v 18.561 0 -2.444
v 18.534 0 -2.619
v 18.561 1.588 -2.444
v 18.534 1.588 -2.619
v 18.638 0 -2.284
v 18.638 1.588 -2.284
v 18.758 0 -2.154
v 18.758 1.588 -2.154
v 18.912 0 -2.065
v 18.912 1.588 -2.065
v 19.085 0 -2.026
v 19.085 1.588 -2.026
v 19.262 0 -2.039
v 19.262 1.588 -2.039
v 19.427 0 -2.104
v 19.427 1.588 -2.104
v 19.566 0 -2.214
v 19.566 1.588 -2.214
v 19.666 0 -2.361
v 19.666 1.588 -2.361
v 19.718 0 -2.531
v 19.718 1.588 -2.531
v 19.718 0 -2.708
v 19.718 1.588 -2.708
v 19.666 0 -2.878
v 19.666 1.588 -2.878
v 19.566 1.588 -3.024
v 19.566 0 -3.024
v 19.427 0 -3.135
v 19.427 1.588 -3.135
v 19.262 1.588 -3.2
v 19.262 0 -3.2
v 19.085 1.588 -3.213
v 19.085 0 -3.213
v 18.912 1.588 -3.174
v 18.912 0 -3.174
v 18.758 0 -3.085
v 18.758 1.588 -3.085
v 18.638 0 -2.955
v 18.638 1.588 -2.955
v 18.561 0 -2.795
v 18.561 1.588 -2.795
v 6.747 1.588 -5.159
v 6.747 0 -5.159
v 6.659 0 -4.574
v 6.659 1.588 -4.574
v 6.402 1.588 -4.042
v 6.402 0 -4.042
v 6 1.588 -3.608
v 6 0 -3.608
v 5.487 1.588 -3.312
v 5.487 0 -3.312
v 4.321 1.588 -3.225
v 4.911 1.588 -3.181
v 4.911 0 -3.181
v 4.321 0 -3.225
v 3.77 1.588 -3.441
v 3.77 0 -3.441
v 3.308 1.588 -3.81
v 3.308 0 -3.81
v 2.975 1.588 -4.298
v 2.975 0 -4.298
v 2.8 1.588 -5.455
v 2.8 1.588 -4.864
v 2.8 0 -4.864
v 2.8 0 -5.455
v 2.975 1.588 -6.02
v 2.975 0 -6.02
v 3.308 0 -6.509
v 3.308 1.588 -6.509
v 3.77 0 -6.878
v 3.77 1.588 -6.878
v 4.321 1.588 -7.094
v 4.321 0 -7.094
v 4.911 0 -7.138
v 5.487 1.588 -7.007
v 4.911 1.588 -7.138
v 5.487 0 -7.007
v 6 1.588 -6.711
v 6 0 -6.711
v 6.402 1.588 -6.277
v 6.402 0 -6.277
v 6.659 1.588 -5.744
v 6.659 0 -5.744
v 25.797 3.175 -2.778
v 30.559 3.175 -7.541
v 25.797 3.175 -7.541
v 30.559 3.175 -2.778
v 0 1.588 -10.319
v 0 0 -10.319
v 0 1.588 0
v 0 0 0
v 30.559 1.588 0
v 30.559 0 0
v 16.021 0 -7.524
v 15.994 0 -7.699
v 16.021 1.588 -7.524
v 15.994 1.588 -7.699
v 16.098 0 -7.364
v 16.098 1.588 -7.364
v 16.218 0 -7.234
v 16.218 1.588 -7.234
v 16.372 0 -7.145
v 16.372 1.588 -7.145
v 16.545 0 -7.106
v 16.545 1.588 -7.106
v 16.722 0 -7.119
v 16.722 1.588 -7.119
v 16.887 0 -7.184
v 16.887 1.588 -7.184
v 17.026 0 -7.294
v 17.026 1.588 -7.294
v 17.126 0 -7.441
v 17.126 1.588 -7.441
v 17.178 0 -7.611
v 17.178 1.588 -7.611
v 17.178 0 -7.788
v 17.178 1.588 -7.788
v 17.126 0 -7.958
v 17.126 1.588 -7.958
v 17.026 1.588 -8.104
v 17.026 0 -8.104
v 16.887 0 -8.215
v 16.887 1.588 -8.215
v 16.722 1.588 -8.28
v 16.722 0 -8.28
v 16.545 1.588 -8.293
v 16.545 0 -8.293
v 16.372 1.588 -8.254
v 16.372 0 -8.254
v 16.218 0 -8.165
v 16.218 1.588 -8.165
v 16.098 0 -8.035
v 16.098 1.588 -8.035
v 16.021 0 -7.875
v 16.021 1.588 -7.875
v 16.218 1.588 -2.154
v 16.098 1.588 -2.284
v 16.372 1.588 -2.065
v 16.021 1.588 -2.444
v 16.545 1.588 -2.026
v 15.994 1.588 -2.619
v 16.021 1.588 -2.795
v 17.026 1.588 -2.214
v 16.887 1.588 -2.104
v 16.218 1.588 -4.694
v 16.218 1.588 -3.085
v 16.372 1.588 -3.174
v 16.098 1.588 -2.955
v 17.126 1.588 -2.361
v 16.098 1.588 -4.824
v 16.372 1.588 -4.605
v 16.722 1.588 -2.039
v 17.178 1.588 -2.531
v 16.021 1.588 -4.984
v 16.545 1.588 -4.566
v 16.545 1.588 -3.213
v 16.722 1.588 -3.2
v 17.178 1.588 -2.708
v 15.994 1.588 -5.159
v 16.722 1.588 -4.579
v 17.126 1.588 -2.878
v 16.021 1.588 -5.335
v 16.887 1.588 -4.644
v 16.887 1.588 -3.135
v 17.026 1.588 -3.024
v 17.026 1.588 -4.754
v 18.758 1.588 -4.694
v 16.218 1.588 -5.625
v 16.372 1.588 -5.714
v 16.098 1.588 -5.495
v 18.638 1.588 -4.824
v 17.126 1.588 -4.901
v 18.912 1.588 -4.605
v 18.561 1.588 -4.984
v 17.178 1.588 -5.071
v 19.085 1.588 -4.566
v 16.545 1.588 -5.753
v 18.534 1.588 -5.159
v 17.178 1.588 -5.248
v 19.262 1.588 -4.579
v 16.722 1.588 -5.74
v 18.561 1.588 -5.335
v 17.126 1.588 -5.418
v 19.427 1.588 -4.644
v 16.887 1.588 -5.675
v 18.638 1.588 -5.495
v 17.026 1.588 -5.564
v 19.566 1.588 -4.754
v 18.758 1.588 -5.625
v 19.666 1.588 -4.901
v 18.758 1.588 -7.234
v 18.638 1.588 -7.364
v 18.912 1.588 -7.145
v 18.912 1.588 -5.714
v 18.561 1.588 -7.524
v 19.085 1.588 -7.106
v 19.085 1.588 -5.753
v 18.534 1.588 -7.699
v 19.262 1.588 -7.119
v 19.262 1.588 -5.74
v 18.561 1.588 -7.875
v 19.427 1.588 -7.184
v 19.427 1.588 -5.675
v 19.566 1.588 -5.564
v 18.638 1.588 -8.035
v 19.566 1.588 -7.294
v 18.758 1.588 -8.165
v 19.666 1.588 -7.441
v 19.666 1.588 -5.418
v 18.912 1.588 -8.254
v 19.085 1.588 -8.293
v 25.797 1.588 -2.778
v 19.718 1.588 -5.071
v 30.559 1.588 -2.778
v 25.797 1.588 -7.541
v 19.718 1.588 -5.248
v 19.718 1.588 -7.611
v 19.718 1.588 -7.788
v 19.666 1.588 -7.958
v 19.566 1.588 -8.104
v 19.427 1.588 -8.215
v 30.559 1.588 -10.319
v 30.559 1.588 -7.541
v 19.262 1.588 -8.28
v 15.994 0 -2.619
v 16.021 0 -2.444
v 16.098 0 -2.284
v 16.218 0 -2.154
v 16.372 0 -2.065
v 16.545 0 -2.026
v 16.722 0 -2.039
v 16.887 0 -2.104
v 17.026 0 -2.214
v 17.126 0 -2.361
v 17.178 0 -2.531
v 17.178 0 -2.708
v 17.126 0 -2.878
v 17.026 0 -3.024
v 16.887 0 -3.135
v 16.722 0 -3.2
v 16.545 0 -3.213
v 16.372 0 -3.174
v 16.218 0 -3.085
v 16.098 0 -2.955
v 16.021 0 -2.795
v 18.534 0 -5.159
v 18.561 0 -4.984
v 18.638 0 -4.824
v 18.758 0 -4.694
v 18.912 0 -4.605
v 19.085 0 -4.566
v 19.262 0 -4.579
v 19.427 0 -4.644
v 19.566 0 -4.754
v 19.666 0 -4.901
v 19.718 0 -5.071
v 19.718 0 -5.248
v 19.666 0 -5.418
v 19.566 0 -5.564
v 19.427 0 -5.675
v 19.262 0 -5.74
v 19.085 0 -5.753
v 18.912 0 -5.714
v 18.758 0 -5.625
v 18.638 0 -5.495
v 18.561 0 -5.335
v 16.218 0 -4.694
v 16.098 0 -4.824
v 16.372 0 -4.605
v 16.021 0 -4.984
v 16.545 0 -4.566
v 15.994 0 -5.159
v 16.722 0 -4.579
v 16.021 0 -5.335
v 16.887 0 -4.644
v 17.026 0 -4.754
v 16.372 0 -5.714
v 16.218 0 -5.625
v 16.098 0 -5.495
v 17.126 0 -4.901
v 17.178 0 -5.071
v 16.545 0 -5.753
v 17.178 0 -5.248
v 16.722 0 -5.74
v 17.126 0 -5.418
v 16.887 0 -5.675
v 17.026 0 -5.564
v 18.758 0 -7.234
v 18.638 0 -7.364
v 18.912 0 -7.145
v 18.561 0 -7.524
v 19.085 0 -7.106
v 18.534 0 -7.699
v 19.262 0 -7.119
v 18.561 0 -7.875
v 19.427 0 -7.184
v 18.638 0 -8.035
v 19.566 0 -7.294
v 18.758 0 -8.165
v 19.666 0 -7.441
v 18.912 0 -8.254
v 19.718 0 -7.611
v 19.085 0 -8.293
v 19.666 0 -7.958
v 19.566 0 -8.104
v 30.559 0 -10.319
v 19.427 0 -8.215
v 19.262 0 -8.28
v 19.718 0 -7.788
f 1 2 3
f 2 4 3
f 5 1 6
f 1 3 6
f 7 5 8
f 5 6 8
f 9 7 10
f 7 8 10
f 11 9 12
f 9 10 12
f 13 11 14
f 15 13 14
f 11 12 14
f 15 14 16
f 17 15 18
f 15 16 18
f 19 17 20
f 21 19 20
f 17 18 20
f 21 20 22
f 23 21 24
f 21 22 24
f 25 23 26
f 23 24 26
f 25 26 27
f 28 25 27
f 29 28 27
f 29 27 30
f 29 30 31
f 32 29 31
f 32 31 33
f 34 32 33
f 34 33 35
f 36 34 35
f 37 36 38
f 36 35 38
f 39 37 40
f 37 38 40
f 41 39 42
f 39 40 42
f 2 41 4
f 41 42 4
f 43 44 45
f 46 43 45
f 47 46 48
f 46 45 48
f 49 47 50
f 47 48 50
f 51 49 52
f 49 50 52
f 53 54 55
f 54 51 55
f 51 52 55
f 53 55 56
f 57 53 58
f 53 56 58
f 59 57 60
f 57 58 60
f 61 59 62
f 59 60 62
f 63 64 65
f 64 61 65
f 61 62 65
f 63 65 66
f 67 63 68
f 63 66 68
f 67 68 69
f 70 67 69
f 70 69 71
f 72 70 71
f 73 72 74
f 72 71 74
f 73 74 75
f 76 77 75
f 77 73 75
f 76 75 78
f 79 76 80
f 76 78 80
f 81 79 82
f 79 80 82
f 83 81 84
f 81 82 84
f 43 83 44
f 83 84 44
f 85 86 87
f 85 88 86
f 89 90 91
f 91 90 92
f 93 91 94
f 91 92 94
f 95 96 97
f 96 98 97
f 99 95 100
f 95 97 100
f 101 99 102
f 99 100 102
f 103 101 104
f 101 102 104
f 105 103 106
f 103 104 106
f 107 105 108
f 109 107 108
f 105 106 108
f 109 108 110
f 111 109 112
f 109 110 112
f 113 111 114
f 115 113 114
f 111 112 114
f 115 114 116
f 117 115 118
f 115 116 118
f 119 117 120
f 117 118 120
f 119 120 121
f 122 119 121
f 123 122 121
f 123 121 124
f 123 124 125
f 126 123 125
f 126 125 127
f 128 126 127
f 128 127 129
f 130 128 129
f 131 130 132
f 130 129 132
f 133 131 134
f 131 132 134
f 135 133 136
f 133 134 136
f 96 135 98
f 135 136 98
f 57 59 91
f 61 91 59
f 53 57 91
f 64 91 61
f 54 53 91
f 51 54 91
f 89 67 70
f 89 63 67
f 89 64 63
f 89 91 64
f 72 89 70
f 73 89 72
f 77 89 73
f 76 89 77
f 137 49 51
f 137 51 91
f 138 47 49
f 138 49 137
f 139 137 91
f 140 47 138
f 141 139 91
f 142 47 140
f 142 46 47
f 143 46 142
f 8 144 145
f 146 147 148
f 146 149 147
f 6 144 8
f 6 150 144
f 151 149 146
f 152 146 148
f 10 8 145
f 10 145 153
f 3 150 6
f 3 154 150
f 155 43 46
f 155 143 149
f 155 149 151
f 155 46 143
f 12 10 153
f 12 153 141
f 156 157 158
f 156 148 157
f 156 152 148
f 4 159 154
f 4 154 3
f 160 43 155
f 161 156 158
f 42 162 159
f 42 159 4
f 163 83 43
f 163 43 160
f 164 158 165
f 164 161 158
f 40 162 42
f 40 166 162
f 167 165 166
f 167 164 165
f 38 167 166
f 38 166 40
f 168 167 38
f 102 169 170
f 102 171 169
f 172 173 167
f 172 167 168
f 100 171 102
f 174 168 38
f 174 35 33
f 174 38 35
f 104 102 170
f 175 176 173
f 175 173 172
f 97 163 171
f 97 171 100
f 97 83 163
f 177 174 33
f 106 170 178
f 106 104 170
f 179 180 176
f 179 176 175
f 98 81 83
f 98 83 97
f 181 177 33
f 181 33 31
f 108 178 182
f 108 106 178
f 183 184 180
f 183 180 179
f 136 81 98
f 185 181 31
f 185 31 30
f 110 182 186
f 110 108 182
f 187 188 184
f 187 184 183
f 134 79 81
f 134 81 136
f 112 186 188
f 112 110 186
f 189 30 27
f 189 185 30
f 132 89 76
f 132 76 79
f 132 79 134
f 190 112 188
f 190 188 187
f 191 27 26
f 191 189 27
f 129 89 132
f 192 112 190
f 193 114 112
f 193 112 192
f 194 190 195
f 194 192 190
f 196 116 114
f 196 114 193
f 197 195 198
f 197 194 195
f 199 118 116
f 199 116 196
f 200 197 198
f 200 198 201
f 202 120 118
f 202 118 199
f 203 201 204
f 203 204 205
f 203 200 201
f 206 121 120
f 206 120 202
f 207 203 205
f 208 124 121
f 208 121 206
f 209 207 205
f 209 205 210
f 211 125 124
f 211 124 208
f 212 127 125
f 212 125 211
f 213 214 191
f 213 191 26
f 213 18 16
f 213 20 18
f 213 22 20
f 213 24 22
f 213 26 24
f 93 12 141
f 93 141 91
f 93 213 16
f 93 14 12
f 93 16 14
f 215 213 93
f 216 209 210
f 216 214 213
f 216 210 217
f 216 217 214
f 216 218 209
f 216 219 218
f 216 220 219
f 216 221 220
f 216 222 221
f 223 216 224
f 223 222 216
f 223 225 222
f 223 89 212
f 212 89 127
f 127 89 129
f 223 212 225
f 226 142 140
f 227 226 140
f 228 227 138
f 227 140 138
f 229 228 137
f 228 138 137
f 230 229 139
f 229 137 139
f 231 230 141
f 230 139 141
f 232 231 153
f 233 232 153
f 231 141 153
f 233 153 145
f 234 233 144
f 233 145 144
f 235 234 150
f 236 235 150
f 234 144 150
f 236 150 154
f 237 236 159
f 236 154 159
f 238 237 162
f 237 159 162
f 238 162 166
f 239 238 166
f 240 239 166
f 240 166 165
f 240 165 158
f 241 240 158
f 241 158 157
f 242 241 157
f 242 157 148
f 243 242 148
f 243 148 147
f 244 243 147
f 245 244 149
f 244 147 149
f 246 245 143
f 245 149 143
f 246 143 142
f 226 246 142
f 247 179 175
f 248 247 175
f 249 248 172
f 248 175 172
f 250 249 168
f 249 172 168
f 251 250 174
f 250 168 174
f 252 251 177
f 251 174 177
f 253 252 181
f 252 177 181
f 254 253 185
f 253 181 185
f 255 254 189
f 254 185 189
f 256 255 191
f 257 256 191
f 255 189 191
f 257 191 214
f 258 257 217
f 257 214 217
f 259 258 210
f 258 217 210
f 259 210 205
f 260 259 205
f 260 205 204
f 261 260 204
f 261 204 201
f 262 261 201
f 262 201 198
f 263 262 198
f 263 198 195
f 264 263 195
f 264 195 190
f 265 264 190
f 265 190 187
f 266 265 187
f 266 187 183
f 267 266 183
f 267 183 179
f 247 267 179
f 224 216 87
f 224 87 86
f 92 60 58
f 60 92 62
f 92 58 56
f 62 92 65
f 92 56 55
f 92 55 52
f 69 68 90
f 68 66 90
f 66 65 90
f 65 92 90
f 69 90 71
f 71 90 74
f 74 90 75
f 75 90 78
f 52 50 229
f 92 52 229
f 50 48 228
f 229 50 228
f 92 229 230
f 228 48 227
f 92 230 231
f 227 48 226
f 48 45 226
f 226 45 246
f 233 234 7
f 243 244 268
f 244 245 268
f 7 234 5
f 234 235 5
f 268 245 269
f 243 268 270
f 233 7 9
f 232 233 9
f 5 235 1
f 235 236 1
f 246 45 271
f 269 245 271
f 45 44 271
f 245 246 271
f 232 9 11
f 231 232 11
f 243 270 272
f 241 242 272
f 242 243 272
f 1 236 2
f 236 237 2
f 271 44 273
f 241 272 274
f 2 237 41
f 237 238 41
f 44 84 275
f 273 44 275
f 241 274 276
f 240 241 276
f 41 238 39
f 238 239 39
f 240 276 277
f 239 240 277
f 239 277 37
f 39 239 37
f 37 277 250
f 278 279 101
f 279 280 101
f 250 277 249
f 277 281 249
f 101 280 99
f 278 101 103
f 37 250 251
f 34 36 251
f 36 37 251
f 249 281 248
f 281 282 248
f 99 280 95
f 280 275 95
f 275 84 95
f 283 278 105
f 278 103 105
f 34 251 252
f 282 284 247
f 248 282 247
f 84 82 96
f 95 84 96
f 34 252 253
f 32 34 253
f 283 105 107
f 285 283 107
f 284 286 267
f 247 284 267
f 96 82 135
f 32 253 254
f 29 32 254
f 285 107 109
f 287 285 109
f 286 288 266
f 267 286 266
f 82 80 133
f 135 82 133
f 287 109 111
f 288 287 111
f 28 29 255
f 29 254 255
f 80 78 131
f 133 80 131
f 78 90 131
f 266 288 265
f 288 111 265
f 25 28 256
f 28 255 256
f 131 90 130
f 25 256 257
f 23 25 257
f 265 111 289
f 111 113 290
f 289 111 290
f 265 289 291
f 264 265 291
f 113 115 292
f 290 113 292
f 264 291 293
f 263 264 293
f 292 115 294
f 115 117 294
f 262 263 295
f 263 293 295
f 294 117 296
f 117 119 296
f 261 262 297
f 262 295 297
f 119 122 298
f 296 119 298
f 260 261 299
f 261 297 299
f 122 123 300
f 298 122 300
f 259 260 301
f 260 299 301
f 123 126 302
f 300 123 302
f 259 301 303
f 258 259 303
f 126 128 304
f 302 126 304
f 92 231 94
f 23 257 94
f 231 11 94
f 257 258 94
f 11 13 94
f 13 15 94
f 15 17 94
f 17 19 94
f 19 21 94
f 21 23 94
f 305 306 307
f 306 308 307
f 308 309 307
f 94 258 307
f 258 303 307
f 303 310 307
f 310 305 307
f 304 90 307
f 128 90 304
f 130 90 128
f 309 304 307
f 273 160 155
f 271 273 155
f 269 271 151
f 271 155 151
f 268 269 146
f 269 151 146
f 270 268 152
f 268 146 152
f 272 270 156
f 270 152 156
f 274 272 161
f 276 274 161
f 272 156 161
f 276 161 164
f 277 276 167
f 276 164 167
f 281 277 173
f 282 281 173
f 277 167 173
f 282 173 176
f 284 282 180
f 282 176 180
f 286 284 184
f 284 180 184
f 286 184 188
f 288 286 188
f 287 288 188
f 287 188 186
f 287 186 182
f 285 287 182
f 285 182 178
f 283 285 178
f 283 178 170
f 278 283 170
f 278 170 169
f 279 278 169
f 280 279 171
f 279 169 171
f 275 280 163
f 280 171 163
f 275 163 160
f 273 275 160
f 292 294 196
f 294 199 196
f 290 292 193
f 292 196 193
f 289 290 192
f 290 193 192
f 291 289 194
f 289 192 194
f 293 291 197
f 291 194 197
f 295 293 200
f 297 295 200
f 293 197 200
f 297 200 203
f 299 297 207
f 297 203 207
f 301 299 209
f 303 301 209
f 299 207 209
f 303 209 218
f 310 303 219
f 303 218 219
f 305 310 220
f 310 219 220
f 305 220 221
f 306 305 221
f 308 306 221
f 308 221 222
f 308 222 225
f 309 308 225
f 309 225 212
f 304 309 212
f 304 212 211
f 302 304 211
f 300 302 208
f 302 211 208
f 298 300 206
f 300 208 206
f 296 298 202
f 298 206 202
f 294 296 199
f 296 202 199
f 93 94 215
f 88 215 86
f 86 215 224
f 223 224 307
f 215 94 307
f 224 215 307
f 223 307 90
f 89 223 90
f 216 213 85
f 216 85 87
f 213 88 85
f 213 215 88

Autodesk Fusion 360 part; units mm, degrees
sketch "Sketch1" plane through (0, 0, 0) normal (0, 1, 0) x (1, 0, 0) in component "Fast Light Board"
  line L0 (0, 0) -> (30.5594, 0)
  line L1 (30.5594, 0) -> (30.5594, 10.3188)
  line L2 (30.5594, 10.3188) -> (0, 10.3188)
  line L3 (0, 10.3188) -> (0, 0)
  circle A0 centre (4.7625, 5.1594) radius 1.9844
  dimension "d1" = 10.3188
  dimension "d2" = 30.5594
  dimension "d4" = 3.9688
extrude "Extrude1" add sketch "Sketch1" along normal blind 1.5875 in component "Fast Light Board"
sketch "Sketch2" plane through (0, 1.5875, 0) normal (0, 1, 0) x (-1, 0, 0) in component "Fast Light Board"
  circle A0 centre (-4.7625, -5.1594) radius 1.9844
  line L0 (0, -10.3188) -> (0, 0)
  line L1 (0, 0) -> (-30.5594, 0)
  line L2 (-30.5594, 0) -> (-30.5594, -10.3188)
  line L3 (-30.5594, -10.3188) -> (0, -10.3188)
  line L4 (-25.7969, -5.1594) -> (-25.7969, -7.5406)
  line L5 (-25.7969, -7.5406) -> (-30.5594, -7.5406)
  line L6 (-30.5594, -5.1594) -> (-30.5594, -7.5406)
  line L7 (-30.5594, -5.1594) -> (-30.5594, -2.7781)
  line L8 (-30.5594, -2.7781) -> (-25.7969, -2.7781)
  line L9 (-25.7969, -2.7781) -> (-25.7969, -5.1594)
  dimension "d7" = 4.7625
extrude "Extrude2" add sketch "Sketch2" along normal blind 1.5875 contours L2 L4 L5 L6 L7 L8 L9 in component "Fast Light Board"
sketch "Sketch3" plane through (0, 1.5875, 0) normal (0, 1, 0) x (-1, 0, 0) in component "Fast Light Board"
  line L0 (-25.7969, -7.5406) -> (-30.5594, -7.5406)
  line L1 (-30.5594, -7.5406) -> (-30.5594, -10.3188)
  line L2 (-30.5594, -10.3188) -> (0, -10.3188)
  line L3 (0, -10.3188) -> (0, 0)
  line L4 (0, 0) -> (-30.5594, 0)
  line L5 (-30.5594, 0) -> (-30.5594, -2.7781)
  line L6 (-30.5594, -2.7781) -> (-25.7969, -2.7781)
  line L7 (-25.7969, -2.7781) -> (-25.7969, -7.5406)
  circle A0 centre (-4.7625, -5.1594) radius 1.9844
  line L8 (-30.5594, -5.1594) -> (-17.8594, -5.1594)
  line L9 (-17.8594, -5.1594) -> (-19.1294, -5.1594)
  circle A1 centre (-19.1294, -5.1594) radius 0.5953
  circle A2 centre (-16.5894, -5.1594) radius 0.5953
  circle A3 centre (-19.1294, -7.6994) radius 0.5953
  circle A4 centre (-16.5894, -7.6994) radius 0.5953
  circle A5 centre (-16.5894, -2.6194) radius 0.5953
  circle A6 centre (-19.1294, -2.6194) radius 0.5953
  dimension "d12" = 12.7
  dimension "d13" = 1.27
  dimension "d14" = 1.1906
  dimension "d15" = 1.1906
  dimension "d16" = 1.1906
  dimension "d17" = 1.1906
  dimension "d18" = 1.1906
  dimension "d19" = 1.1906
extrude "Extrude3" cut sketch "Sketch3" against normal blind 1.5875 contours L8 L9 A1 | L8 L9 A1 | A2 | A3 | A4 | A5 | A6 in component "Fast Light Board"
component "Fast Light Board" placed x (1, 0, 0) y (0, 1, 0) z (0, 0, 1) at (0, 0, 0)
equation "d1 = ( 13 / 32 ) * 1 in"
equation "d2 = 1 13/64\""
equation "d4 = ( 5 / 32 ) * 1 in"
equation "d5 = ( 1 / 16 ) * 1 in"
equation "d7 = ( 3 / 16 ) * 1 in"
equation "d10 = ( 1 / 16 ) * 1 in"
equation "d14 = ( 3 / 64 ) * 1 in"
equation "d15 = ( 3 / 64 ) * 1 in"
equation "d16 = ( 3 / 64 ) * 1 in"
equation "d17 = ( 3 / 64 ) * 1 in"
equation "d18 = ( 3 / 64 ) * 1 in"
equation "d19 = ( 3 / 64 ) * 1 in"
equation "d20 = ( -1 / 16 ) * 1 in"
properties part number "fast-rgb-led-insert"
